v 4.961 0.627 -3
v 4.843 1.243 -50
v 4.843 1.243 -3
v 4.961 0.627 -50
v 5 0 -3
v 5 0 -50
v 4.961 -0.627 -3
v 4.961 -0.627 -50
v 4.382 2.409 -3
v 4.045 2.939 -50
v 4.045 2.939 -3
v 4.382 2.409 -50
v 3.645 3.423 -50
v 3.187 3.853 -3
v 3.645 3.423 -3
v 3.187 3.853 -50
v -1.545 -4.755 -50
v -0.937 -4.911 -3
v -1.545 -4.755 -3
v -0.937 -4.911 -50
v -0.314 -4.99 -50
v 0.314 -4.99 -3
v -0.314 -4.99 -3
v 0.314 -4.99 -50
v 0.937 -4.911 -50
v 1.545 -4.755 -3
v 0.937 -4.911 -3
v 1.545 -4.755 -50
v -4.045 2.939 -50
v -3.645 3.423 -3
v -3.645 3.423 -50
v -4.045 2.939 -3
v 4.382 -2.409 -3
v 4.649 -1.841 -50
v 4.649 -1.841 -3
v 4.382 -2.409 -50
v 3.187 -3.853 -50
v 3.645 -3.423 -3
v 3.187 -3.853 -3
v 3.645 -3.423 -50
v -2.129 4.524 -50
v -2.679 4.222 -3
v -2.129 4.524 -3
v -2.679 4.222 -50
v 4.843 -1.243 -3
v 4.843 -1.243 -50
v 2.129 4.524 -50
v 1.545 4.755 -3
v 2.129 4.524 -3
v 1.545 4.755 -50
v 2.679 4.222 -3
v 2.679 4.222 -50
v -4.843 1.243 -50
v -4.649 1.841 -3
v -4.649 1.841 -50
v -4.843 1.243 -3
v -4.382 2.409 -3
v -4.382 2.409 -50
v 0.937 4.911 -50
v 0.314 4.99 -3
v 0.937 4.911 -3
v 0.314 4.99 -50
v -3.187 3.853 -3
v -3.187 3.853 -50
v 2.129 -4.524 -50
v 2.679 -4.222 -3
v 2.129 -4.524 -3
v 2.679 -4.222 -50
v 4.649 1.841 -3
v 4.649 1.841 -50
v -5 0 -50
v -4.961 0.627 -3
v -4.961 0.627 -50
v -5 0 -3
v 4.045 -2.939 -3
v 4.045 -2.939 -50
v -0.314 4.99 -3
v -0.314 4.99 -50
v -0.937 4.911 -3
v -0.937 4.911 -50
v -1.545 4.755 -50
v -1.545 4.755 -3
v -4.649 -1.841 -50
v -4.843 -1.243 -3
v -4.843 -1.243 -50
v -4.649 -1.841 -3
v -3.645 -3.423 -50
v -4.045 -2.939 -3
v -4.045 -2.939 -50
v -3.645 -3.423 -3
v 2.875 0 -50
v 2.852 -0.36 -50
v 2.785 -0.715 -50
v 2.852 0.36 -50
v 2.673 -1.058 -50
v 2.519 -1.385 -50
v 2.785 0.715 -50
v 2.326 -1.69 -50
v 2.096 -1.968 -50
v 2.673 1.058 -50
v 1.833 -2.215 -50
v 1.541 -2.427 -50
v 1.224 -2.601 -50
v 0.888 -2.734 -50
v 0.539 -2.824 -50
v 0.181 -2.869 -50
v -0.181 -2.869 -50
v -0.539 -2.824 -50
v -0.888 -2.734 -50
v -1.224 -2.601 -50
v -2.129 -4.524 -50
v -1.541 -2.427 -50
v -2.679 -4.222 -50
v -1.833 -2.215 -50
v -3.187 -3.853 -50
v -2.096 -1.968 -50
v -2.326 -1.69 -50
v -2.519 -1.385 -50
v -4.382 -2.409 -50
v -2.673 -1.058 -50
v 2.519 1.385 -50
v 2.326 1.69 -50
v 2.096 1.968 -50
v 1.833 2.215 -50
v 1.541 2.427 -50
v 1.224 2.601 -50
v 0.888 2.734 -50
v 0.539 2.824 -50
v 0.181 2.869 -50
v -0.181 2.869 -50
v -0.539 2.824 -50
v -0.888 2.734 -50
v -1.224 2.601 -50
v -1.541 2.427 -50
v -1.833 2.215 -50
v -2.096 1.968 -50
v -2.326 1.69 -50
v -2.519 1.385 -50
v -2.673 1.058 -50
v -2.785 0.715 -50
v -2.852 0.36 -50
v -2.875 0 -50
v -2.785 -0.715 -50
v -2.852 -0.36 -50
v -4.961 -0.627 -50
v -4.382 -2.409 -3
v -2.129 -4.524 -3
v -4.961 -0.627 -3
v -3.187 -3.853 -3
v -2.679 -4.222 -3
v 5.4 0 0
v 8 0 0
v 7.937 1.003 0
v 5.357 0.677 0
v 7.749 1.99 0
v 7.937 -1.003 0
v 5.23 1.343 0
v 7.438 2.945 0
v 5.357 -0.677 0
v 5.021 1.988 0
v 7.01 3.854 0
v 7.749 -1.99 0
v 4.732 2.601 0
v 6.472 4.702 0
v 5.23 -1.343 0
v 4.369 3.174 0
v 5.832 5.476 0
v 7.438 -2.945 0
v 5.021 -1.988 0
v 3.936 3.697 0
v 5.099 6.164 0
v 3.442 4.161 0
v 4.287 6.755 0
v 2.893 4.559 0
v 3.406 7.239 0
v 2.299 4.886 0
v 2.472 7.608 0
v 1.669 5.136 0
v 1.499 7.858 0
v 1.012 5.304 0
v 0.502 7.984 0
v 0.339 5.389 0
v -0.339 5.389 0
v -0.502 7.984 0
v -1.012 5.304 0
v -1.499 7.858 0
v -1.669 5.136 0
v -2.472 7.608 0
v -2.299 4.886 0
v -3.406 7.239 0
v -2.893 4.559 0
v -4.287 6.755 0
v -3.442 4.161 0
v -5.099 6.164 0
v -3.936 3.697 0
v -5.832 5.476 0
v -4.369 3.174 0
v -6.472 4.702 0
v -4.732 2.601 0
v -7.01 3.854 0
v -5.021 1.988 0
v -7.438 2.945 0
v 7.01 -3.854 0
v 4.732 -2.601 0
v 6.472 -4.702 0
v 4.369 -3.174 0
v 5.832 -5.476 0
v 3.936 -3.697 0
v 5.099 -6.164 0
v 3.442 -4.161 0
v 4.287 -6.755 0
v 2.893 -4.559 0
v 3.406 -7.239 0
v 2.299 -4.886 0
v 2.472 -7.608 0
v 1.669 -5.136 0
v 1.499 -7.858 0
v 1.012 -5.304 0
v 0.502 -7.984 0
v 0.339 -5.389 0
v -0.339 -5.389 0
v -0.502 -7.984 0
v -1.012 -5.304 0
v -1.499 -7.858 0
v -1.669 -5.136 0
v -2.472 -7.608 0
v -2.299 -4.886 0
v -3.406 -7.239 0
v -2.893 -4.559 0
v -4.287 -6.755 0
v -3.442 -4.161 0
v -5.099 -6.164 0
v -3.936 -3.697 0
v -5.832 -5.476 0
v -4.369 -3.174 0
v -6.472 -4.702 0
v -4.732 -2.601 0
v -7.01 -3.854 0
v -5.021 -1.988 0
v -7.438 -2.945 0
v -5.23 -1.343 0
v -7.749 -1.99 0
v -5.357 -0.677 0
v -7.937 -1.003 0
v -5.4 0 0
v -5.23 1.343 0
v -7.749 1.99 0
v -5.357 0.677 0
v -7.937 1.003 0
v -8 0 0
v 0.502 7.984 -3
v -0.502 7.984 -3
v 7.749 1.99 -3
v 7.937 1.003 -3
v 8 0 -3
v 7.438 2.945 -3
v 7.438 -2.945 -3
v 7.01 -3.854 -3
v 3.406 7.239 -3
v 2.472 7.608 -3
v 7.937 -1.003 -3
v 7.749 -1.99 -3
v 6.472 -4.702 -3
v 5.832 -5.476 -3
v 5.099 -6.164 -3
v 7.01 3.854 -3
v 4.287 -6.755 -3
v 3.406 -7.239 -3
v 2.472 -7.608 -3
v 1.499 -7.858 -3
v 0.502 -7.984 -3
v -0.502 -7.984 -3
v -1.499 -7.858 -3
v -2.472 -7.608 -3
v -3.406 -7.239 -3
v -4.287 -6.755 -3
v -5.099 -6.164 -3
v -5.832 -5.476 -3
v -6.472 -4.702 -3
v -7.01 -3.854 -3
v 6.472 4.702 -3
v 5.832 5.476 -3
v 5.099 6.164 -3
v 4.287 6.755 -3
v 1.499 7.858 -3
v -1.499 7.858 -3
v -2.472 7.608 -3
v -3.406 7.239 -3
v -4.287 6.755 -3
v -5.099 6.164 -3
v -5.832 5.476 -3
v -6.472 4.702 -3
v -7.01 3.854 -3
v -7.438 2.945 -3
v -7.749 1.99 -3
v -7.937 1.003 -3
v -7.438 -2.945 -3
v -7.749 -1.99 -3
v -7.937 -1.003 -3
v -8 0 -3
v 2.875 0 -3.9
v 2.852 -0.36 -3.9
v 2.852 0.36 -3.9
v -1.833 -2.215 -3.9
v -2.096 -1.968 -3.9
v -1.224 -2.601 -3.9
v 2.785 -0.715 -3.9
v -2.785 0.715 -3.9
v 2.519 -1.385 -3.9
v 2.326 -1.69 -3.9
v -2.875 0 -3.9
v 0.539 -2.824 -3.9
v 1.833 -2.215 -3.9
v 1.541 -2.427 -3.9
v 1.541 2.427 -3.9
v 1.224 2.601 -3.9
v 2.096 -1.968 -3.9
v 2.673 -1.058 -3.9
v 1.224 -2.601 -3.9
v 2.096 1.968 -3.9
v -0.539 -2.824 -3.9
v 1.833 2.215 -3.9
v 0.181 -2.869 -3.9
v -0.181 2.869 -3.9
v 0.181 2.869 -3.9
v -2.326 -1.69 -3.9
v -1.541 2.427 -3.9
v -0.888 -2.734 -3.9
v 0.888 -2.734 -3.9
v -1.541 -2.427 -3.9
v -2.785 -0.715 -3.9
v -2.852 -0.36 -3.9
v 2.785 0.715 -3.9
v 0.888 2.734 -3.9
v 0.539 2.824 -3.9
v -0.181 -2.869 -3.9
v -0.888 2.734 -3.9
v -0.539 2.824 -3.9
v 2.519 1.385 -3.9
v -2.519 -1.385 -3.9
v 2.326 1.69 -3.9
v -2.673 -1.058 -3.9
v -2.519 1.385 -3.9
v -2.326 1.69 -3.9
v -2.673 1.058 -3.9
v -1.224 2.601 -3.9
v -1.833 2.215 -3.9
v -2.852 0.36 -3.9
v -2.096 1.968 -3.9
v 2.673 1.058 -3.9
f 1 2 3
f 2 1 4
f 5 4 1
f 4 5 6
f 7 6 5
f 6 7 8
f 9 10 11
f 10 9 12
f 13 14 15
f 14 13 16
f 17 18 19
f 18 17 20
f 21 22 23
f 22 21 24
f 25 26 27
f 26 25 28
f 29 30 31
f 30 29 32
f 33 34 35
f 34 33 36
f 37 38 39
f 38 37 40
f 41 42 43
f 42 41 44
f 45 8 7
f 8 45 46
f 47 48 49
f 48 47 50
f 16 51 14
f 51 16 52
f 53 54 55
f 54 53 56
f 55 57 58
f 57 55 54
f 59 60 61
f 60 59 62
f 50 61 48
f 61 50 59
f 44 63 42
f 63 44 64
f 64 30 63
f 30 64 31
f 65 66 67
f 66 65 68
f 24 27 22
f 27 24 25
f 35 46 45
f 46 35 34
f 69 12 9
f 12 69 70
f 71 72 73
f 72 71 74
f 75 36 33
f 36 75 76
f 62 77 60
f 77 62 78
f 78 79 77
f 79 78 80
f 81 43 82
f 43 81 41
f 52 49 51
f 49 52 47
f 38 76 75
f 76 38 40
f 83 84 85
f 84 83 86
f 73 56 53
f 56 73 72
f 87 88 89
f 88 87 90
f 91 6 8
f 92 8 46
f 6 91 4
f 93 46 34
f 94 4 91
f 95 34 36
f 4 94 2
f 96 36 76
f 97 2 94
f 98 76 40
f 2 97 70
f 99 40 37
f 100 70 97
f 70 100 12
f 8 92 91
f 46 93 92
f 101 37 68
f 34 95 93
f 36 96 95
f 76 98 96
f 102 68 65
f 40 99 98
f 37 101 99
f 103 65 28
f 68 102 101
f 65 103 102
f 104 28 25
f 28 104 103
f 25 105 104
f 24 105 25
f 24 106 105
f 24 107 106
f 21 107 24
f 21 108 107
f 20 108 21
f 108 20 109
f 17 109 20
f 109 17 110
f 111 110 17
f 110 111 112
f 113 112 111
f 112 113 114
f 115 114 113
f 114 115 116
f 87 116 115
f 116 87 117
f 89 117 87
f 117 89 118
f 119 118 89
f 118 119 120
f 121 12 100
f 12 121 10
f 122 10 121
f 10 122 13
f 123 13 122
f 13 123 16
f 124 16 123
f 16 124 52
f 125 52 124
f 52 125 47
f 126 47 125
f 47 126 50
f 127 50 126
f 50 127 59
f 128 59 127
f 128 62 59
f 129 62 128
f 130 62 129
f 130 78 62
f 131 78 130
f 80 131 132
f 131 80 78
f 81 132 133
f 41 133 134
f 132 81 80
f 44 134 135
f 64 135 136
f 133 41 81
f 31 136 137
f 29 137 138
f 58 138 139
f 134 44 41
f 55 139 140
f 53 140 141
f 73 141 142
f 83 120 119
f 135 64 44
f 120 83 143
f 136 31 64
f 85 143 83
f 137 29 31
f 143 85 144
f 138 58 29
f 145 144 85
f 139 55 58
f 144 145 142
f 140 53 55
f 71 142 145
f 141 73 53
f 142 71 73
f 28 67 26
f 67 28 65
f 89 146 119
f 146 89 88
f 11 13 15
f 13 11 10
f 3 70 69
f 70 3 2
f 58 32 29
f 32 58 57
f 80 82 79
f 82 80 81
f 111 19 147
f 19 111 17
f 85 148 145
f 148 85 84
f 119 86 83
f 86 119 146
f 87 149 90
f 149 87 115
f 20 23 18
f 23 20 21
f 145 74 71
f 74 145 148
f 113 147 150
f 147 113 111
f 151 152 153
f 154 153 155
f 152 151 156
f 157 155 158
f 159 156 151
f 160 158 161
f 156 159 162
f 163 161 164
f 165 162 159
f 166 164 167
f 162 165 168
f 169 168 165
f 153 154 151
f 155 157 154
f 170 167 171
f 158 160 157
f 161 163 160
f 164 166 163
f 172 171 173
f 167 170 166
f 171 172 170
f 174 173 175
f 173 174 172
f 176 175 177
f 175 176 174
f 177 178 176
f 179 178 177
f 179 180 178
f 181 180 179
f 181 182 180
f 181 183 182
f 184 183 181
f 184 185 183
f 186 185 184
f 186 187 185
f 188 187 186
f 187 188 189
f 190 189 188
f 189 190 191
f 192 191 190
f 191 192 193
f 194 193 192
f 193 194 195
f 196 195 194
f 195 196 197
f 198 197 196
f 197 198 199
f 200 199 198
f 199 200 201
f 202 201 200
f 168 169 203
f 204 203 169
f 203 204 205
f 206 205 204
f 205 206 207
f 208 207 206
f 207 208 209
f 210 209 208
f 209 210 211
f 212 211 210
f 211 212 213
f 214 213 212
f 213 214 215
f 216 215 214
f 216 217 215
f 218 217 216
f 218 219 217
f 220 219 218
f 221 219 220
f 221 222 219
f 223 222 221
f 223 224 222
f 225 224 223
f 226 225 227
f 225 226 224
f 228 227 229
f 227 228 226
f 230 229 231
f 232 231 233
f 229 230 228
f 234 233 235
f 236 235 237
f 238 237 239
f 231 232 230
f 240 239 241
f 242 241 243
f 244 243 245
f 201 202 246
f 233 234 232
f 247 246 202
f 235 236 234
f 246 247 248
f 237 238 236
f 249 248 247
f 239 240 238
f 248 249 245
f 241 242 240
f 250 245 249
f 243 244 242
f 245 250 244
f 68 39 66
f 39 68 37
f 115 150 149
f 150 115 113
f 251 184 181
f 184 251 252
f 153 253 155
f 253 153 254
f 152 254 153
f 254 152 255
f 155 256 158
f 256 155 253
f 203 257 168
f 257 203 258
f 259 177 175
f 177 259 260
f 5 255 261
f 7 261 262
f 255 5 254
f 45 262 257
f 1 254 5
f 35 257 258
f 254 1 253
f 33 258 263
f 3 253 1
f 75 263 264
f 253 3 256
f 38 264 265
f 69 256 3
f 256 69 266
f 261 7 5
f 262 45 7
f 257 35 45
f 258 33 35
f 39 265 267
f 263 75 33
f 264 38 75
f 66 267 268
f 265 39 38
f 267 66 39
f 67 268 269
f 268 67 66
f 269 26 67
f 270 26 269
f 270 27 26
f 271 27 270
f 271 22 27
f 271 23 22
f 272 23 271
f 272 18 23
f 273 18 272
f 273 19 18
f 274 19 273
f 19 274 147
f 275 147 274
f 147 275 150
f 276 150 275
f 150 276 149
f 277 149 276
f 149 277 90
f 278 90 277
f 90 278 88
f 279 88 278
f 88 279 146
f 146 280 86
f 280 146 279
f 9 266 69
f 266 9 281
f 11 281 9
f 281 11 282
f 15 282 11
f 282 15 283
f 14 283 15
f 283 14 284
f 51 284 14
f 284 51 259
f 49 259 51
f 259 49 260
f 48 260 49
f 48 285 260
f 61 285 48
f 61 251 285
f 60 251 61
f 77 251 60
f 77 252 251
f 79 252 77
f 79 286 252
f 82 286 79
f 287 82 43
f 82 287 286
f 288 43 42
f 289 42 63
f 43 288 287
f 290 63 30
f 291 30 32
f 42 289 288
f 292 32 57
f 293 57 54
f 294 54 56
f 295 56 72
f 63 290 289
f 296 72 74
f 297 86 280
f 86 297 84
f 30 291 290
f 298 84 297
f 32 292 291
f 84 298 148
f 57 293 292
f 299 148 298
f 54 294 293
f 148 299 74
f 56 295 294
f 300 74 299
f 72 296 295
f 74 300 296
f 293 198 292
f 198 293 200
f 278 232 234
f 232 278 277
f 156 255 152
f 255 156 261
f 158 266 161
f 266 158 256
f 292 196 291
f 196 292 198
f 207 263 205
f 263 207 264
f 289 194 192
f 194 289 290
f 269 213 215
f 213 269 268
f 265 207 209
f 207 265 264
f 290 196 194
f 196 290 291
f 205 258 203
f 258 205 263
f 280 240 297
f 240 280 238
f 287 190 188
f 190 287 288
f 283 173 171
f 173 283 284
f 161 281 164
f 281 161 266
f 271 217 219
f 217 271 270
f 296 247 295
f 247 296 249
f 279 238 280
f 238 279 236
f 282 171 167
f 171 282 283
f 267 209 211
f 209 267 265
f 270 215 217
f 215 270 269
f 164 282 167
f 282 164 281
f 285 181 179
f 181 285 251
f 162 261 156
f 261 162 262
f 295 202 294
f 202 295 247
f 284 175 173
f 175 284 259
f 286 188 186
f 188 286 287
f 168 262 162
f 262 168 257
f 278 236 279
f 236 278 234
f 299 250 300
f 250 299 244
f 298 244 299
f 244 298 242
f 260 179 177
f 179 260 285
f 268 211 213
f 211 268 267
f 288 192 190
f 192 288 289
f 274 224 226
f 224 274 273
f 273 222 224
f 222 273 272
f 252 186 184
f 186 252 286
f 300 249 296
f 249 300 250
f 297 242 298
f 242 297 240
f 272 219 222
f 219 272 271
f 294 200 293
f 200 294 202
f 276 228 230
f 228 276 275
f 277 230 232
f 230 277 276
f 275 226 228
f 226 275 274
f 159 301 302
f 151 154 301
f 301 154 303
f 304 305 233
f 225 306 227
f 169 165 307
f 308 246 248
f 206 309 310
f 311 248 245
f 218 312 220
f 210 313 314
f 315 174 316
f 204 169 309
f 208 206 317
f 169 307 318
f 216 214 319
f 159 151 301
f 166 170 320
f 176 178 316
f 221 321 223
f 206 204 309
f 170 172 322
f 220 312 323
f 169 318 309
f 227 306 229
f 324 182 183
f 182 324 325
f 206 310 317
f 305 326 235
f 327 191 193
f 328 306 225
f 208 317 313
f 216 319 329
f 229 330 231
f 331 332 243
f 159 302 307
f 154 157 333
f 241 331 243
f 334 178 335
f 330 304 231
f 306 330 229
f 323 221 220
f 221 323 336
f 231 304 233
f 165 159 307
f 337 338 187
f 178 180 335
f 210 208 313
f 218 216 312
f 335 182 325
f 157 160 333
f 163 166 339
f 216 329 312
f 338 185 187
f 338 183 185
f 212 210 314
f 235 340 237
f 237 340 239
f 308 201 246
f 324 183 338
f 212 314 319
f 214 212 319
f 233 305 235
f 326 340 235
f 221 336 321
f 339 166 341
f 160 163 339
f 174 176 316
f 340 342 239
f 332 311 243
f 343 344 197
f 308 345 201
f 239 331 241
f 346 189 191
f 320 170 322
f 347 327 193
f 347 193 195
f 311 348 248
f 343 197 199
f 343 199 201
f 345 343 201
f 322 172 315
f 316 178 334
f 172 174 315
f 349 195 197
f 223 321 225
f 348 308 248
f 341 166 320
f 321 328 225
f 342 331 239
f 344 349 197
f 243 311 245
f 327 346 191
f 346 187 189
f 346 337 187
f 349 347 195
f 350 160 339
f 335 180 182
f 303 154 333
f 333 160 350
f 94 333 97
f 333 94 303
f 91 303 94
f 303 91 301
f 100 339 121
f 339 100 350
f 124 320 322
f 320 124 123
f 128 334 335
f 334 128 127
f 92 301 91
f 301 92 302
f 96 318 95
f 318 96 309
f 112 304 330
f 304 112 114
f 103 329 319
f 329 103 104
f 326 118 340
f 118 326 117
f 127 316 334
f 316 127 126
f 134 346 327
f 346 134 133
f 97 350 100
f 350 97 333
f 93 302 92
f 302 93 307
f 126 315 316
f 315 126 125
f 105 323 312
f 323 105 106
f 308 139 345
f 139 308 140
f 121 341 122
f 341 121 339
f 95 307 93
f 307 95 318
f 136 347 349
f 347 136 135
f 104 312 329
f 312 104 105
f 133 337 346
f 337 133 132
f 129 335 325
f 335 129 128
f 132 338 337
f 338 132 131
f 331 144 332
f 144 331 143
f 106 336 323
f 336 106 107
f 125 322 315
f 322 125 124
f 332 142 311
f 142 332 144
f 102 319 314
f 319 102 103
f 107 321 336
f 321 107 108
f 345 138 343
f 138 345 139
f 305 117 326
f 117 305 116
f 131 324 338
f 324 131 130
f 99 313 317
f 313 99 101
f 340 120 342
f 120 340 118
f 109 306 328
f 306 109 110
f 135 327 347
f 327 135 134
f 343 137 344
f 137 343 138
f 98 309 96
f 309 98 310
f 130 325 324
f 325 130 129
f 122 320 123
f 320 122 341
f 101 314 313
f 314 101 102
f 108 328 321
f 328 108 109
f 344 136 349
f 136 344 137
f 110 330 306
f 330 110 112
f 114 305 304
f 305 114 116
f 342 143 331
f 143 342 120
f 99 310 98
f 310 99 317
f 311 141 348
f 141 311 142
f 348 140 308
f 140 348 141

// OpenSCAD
$fn = 50;


difference() {
	union() {
		translate(v = [0, 0, -50.0000000000]) {
			cylinder(h = 50, r = 5.0000000000);
		}
		translate(v = [0, 0, -3.0000000000]) {
			cylinder(h = 3, r = 8.0000000000);
		}
	}
	union() {
		translate(v = [0, 0, 0]) {
			rotate(a = [0, 0, 0]) {
				difference() {
					union() {
						#translate(v = [0, 0, -50.0000000000]) {
							cylinder(h = 50, r = 2.6000000000);
						}
						#translate(v = [0, 0, -3.9000000000]) {
							cylinder(h = 3.9000000000, r = 5.0000000000, r1 = 2.8750000000, r2 = 5.4000000000);
						}
						#translate(v = [0, 0, -50.0000000000]) {
							cylinder(h = 50, r = 2.8750000000);
						}
						#translate(v = [0, 0, -50.0000000000]) {
							cylinder(h = 50, r = 2.6000000000);
						}
					}
					union();
				}
			}
		}
	}
}
